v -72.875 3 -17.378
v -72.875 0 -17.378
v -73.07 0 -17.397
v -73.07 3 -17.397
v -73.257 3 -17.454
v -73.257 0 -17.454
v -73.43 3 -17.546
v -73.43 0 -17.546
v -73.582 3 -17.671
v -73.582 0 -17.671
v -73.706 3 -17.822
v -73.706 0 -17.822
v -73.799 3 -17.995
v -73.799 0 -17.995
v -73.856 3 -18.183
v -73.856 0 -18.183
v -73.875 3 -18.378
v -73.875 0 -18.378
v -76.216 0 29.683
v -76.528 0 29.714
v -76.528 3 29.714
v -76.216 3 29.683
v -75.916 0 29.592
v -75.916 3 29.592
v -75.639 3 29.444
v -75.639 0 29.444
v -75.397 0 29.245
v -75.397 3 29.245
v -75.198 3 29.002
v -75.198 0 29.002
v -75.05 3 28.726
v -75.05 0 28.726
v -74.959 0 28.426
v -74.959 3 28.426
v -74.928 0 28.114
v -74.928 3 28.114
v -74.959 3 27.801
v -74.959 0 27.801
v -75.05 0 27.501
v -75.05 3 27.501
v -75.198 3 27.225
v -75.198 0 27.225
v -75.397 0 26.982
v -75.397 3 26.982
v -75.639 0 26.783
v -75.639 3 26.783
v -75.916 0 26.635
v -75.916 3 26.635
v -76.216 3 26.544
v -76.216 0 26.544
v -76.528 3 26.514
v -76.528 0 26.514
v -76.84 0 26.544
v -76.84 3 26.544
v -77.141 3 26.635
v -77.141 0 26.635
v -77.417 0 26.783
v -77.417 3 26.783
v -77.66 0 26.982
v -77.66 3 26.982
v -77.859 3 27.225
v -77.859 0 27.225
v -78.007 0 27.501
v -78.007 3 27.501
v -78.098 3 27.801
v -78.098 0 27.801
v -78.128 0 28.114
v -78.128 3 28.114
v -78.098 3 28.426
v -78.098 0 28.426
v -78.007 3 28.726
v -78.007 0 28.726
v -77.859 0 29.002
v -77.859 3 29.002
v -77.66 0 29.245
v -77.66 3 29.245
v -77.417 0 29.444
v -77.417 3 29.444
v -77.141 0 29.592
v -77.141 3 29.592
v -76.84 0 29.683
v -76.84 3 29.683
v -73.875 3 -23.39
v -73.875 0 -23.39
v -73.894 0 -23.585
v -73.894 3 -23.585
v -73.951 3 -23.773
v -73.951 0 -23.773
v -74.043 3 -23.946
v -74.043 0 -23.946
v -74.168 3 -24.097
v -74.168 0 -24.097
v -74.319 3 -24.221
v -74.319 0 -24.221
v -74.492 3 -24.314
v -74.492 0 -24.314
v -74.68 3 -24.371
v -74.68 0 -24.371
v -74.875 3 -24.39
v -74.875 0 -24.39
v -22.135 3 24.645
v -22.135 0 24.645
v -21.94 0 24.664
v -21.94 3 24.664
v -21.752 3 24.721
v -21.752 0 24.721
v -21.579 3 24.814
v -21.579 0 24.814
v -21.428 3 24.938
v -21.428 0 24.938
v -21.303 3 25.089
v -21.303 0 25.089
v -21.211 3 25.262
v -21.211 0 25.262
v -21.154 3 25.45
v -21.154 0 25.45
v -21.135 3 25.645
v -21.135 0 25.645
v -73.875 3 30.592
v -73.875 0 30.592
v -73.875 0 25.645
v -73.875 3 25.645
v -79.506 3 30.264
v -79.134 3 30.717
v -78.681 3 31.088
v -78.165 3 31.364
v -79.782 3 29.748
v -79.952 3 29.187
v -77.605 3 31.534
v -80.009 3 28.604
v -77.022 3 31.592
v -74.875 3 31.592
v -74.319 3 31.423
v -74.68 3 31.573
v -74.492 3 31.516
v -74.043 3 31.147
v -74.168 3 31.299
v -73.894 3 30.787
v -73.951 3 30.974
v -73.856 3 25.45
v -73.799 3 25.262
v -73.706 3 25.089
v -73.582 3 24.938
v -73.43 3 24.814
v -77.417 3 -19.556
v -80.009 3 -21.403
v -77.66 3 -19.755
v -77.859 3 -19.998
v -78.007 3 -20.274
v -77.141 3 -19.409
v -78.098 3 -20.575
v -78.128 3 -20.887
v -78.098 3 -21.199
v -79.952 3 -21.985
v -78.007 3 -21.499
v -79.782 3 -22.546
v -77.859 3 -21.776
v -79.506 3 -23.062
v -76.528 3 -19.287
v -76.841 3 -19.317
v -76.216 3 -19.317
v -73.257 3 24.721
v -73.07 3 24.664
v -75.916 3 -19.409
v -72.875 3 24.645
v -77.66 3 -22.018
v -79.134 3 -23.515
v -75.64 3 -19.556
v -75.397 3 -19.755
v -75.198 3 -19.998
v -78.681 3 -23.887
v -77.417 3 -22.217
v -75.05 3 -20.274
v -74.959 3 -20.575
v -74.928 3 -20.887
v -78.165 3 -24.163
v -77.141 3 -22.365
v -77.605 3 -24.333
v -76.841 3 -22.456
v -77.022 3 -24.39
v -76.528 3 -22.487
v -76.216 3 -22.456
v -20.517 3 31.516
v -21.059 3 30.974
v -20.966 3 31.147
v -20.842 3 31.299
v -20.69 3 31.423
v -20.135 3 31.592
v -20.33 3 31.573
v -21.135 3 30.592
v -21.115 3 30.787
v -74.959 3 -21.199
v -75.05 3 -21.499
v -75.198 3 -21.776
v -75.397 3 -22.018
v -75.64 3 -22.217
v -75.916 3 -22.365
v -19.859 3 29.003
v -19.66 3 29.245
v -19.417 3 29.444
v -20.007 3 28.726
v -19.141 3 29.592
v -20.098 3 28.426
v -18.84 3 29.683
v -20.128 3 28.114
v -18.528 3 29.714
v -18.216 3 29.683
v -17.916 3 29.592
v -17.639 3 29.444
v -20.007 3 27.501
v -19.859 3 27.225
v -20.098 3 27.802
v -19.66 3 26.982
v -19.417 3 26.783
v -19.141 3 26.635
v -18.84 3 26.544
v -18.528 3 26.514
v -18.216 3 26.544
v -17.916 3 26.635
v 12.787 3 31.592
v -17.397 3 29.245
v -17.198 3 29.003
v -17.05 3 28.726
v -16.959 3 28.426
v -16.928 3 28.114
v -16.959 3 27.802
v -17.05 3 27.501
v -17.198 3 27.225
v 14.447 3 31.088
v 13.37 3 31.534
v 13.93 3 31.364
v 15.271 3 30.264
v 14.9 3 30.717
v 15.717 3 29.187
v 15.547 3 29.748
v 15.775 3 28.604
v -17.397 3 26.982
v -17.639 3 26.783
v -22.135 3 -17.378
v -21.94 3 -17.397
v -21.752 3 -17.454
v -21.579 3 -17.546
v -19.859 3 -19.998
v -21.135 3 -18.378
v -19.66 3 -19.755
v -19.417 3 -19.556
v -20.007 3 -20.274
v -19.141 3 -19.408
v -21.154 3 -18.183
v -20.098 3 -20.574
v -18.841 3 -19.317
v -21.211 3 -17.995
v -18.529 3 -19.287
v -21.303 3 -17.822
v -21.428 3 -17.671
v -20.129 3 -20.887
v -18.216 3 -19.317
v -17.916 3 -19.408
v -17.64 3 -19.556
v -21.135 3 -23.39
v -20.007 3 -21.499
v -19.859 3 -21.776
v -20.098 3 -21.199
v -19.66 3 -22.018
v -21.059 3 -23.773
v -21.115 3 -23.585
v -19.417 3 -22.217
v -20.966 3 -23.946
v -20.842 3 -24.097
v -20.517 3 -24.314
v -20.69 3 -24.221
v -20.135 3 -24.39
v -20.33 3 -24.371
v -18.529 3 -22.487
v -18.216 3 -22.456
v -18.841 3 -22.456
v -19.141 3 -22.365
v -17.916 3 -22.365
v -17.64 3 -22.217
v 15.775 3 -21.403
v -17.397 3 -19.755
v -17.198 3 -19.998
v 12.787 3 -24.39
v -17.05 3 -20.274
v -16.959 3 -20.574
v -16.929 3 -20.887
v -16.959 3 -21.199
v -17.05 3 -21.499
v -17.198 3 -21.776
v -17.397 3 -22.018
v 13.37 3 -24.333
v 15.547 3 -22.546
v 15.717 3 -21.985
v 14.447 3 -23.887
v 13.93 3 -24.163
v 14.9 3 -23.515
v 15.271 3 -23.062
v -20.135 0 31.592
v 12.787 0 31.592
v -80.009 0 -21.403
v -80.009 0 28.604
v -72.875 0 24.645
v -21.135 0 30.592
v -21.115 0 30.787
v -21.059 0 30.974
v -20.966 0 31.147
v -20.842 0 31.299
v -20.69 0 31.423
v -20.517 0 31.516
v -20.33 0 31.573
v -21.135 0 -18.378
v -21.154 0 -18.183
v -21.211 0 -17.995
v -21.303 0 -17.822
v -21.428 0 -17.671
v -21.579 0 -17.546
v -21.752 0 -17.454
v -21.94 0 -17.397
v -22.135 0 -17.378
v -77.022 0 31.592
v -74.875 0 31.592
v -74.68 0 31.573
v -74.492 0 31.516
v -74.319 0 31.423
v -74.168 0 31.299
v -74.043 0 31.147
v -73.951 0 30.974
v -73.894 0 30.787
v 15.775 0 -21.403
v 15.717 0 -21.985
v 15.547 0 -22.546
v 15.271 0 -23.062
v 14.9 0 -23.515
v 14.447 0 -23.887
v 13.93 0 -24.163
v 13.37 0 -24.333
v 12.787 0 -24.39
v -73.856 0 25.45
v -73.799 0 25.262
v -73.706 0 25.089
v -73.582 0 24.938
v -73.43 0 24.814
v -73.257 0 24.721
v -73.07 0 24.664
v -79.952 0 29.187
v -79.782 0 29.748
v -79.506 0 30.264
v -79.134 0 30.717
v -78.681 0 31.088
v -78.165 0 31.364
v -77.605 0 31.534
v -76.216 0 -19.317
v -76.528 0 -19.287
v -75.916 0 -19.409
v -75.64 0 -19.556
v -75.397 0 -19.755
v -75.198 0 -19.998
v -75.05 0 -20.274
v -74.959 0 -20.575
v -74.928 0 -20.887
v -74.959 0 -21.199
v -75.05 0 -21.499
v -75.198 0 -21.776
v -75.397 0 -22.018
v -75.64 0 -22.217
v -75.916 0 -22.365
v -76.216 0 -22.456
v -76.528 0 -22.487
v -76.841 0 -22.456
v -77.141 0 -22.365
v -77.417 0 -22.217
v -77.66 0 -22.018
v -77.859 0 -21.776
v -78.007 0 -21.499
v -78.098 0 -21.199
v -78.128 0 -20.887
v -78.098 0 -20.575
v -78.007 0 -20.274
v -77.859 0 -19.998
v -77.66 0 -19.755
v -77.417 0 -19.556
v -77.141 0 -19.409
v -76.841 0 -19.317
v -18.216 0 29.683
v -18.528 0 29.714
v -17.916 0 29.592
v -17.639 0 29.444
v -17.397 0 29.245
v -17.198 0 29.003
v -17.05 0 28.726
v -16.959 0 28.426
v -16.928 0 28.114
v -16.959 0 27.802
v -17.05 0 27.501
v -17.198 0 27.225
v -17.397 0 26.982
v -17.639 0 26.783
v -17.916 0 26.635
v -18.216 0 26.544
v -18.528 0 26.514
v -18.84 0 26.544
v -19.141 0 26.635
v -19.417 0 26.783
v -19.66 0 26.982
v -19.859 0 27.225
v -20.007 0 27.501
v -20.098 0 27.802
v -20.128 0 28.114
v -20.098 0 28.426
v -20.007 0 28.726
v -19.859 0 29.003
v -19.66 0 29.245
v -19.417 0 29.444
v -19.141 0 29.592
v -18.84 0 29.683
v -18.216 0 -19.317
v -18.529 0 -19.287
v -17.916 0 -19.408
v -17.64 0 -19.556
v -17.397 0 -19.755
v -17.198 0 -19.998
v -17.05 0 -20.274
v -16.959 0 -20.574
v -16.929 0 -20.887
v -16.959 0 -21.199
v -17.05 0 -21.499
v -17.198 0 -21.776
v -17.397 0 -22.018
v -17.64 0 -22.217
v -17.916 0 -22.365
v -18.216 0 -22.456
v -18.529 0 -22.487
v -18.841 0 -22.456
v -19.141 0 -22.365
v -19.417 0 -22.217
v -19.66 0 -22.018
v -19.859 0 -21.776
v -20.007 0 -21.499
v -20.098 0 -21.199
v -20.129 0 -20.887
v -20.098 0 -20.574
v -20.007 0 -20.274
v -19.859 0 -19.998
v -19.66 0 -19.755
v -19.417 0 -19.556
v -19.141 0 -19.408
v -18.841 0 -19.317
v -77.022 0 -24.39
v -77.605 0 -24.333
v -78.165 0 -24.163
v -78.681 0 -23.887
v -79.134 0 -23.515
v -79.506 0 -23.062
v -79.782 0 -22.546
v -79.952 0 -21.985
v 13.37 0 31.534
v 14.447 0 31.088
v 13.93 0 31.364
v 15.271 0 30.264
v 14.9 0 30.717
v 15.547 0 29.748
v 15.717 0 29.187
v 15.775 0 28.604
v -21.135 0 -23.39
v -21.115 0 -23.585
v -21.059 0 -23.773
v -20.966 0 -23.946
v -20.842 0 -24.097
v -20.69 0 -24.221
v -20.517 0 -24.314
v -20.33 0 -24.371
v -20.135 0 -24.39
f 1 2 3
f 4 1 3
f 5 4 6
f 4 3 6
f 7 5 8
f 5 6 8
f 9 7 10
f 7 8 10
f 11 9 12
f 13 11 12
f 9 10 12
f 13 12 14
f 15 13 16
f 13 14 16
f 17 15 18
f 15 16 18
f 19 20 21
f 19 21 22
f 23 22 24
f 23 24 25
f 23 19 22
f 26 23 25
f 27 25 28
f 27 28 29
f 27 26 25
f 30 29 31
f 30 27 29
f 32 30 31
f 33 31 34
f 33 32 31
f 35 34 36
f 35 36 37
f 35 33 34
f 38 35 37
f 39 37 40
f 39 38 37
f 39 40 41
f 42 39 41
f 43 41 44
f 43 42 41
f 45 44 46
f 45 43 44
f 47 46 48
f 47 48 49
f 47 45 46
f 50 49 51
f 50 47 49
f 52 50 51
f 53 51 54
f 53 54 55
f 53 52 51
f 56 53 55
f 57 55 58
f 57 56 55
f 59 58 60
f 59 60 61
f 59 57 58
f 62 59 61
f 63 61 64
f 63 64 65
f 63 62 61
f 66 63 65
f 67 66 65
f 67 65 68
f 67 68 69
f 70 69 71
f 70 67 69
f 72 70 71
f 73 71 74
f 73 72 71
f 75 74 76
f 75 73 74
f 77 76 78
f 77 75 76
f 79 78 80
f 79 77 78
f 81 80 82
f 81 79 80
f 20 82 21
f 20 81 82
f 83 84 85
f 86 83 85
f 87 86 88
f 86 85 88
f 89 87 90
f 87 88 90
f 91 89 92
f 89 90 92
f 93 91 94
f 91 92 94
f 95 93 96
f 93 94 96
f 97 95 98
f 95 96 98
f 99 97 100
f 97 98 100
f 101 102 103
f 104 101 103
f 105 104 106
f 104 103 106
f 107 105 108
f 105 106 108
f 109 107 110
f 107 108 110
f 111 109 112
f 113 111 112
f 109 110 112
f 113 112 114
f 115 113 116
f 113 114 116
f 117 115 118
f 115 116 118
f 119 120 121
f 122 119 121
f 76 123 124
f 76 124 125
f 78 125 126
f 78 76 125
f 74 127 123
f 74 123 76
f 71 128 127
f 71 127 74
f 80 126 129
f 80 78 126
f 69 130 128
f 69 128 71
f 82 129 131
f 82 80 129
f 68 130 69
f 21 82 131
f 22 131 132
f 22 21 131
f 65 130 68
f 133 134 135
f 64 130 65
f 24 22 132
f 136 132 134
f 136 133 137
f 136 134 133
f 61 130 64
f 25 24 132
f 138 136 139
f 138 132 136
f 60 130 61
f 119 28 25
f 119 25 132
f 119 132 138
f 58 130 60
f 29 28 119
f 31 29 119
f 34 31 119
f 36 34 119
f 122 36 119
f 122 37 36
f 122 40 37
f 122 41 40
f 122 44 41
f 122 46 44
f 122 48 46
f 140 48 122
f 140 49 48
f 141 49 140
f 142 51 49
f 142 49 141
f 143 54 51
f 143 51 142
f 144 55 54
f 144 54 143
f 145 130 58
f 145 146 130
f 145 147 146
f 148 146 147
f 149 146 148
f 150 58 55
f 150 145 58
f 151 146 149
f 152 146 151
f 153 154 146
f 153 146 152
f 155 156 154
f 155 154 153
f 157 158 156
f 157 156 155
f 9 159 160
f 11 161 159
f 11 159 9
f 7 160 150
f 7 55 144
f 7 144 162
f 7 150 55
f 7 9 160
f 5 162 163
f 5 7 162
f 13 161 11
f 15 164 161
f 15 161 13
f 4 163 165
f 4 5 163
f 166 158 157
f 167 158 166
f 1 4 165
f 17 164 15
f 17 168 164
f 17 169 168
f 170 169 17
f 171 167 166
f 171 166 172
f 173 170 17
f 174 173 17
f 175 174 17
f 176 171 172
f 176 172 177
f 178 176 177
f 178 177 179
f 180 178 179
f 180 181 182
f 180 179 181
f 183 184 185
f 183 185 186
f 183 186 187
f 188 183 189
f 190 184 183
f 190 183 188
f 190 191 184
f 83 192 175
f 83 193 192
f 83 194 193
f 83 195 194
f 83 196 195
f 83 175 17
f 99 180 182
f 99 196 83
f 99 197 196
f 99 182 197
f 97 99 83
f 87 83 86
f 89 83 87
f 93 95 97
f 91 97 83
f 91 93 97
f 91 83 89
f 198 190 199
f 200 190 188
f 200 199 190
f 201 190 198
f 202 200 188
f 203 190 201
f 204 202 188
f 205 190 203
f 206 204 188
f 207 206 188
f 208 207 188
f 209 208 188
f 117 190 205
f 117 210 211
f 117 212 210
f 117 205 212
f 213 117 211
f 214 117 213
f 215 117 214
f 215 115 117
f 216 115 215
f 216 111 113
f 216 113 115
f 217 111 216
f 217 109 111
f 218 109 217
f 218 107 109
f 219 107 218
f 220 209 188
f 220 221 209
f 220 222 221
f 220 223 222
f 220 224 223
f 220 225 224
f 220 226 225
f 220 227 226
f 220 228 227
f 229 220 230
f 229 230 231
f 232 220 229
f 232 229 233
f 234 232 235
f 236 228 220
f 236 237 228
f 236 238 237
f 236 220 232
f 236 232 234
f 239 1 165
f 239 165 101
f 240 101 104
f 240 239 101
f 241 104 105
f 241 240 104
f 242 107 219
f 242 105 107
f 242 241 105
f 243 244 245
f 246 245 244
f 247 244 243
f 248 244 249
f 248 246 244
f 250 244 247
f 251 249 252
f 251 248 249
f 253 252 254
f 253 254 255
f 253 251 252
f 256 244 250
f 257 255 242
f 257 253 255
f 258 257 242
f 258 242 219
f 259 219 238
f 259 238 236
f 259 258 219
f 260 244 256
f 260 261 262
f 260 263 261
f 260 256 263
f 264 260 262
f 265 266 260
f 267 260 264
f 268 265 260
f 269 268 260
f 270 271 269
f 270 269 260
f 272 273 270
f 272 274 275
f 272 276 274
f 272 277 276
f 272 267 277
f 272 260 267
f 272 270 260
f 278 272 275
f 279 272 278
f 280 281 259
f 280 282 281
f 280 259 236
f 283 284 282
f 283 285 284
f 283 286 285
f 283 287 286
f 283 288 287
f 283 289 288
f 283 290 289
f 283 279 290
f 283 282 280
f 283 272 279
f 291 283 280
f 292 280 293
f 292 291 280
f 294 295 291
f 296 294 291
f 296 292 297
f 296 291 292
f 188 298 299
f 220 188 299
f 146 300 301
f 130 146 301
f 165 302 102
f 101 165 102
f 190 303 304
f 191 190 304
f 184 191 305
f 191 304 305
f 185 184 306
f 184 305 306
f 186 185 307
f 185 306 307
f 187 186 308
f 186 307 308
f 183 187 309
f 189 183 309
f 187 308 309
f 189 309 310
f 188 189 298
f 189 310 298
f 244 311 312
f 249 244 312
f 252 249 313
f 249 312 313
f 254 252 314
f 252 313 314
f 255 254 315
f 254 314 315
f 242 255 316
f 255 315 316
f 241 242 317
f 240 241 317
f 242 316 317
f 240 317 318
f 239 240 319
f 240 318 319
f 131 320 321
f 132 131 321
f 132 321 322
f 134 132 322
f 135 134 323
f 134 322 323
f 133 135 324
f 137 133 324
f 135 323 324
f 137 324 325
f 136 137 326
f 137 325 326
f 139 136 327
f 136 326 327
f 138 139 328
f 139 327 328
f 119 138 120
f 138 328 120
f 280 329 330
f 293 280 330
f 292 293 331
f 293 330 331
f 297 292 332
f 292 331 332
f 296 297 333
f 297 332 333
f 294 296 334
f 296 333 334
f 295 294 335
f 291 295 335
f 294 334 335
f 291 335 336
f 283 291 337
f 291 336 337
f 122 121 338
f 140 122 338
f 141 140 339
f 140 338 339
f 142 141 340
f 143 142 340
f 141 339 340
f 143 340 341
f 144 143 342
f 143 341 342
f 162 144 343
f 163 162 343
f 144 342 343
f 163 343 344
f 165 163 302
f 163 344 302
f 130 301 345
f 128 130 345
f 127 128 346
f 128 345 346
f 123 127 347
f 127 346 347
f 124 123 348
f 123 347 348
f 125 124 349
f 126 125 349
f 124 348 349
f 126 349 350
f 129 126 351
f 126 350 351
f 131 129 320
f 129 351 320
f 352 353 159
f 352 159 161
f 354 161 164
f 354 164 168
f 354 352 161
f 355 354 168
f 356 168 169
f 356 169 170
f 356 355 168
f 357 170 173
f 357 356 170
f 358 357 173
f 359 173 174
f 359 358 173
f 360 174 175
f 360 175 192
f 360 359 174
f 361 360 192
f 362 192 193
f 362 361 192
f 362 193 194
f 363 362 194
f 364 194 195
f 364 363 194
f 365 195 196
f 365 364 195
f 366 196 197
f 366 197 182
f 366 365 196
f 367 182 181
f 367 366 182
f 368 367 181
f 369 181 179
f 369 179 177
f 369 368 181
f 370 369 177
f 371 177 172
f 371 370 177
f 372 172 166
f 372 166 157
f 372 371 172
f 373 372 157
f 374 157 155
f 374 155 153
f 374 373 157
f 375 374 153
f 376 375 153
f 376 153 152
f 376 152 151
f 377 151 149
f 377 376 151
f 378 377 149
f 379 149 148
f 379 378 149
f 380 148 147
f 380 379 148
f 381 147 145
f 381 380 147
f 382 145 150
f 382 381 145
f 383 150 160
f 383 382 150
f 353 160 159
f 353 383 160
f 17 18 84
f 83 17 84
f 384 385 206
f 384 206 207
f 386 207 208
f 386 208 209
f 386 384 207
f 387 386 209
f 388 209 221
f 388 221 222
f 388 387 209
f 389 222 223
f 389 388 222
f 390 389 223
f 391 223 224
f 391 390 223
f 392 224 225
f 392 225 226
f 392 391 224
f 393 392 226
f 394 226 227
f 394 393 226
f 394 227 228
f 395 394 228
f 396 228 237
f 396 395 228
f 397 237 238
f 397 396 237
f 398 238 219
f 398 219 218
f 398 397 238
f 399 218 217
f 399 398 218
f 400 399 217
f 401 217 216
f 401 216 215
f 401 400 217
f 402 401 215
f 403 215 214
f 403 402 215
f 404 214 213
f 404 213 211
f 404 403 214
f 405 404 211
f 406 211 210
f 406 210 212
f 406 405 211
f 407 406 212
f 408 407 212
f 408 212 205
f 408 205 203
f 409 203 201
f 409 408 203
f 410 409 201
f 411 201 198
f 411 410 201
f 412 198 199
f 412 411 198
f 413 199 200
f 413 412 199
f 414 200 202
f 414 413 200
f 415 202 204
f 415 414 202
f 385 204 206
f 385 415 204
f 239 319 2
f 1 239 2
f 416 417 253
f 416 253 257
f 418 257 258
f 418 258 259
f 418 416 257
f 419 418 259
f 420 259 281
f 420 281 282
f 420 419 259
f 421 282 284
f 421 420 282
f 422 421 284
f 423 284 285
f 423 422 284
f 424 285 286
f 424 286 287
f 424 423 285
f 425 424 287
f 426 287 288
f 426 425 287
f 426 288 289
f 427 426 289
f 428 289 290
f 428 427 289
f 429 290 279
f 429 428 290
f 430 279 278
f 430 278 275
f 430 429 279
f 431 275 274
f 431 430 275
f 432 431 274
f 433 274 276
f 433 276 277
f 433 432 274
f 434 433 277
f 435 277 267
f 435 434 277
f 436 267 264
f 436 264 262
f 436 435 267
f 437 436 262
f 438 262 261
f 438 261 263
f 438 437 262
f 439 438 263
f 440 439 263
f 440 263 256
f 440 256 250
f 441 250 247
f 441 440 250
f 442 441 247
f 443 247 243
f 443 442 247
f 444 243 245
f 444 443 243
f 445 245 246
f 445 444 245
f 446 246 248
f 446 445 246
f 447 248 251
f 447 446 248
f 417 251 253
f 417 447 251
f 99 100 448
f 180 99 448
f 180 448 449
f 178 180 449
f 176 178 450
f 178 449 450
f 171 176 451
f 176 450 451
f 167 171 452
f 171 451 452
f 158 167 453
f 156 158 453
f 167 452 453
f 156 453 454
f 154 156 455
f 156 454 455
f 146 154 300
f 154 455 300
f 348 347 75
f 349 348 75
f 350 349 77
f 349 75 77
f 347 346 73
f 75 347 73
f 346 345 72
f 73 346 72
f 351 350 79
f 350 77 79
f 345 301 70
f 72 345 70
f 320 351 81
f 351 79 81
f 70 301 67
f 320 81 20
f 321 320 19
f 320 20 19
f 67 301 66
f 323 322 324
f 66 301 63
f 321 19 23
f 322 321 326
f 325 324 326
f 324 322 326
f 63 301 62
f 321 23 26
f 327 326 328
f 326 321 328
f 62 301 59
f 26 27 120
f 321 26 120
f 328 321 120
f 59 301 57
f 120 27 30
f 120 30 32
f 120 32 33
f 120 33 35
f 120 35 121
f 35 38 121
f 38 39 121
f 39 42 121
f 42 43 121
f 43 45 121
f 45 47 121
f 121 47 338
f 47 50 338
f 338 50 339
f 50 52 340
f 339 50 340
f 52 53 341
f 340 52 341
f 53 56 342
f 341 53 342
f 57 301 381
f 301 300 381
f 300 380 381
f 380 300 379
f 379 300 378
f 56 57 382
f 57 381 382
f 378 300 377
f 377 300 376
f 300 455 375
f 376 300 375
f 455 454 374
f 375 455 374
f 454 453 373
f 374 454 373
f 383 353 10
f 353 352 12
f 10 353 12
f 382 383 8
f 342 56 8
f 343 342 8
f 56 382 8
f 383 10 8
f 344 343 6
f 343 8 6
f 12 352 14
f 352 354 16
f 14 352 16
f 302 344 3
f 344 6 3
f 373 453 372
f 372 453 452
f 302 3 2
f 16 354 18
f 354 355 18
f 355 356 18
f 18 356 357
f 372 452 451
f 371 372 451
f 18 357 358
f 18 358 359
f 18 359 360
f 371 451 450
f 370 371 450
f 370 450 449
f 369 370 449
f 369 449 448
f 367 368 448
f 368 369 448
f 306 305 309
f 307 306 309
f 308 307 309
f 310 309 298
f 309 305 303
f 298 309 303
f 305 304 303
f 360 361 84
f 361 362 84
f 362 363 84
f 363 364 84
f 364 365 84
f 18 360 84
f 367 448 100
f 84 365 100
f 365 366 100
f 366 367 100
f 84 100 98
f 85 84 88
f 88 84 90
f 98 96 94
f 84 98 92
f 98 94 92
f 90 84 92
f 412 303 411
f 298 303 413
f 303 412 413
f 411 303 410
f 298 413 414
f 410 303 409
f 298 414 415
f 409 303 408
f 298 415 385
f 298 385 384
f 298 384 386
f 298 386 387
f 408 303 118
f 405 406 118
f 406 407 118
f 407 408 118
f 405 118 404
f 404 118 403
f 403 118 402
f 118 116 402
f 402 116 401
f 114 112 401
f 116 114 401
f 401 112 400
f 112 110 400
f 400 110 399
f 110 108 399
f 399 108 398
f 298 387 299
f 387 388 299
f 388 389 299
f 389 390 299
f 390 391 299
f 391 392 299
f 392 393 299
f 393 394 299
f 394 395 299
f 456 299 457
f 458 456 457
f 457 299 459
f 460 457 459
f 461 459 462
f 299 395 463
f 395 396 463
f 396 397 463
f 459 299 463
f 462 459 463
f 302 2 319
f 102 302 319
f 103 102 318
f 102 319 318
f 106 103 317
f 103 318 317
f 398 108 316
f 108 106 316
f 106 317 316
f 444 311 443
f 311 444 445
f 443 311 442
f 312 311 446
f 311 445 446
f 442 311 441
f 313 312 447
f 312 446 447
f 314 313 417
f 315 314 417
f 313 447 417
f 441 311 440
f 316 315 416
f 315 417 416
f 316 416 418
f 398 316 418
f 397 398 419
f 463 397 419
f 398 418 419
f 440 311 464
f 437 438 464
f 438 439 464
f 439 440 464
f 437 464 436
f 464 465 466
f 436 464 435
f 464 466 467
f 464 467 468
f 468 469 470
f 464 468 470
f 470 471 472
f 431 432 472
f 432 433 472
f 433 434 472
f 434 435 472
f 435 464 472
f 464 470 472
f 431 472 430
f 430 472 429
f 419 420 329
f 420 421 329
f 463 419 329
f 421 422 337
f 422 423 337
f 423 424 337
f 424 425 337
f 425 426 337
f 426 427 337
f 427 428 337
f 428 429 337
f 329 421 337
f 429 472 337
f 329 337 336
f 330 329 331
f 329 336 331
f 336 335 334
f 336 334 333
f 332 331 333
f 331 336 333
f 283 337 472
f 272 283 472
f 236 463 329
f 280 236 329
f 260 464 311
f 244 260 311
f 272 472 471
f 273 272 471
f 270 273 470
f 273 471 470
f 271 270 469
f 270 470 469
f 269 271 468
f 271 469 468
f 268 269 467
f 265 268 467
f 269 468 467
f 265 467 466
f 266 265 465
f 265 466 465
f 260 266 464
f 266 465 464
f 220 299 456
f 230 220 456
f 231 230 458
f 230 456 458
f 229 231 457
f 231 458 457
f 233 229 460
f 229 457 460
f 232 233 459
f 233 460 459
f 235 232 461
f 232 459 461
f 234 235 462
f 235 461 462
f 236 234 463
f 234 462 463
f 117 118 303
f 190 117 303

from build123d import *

# Parameters (mm, degrees)
SKETCH_1_R      = 1.6
EXTRUDE_1_DEPTH = 3


with BuildPart() as part:
    # 草图1 → 凸台-拉伸1 (new body)
    with BuildSketch(Plane(origin=(0, 0, 0), x_dir=(1, 0, 0), z_dir=(0, 1, 0))):
        with BuildLine():
            Line((-21.134628196, 23.389975432), (-21.134628196, 18.377736005))
            ThreePointArc((-21.134628196, 18.377736005), (-21.427521415, 17.670629223), (-22.134628196, 17.377736005))
            Line((-22.134628196, 17.377736005), (-72.874730915, 17.377736005))
            ThreePointArc((-72.874730915, 17.377736005), (-73.581837696, 17.670629223), (-73.874730915, 18.377736005))
            Line((-73.874730915, 18.377736005), (-73.874730915, 23.389975432))
            ThreePointArc((-73.874730915, 23.389975432), (-74.167624134, 24.097082213), (-74.874730915, 24.389975432))
            Line((-74.874730915, 24.389975432), (-77.021723127, 24.389975432))
            ThreePointArc((-77.021723127, 24.389975432), (-79.134066788, 23.515014039), (-80.009028181, 21.402670377))
            Line((-80.009028181, 21.402670377), (-80.009028181, -28.604431477))
            ThreePointArc((-80.009028181, -28.604431477), (-79.134066788, -30.716775138), (-77.021723127, -31.591736531))
            Line((-77.021723127, -31.591736531), (-74.874730915, -31.591736531))
            ThreePointArc((-74.874730915, -31.591736531), (-74.167624134, -31.298843313), (-73.874730915, -30.591736531))
            Line((-73.874730915, -30.591736531), (-73.874730915, -25.64502865))
            ThreePointArc((-73.874730915, -25.64502865), (-73.581837696, -24.937921869), (-72.874730915, -24.64502865))
            Line((-72.874730915, -24.64502865), (-22.134628196, -24.64502865))
            ThreePointArc((-22.134628196, -24.64502865), (-21.427521415, -24.937921869), (-21.134628196, -25.64502865))
            Line((-21.134628196, -25.64502865), (-21.134628196, -30.591736531))
            ThreePointArc((-21.134628196, -30.591736531), (-20.841734977, -31.298843313), (-20.134628196, -31.591736531))
            Line((-20.134628196, -31.591736531), (12.787258331, -31.591736531))
            ThreePointArc((12.787258331, -31.591736531), (14.899601993, -30.716775138), (15.774563386, -28.604431477))
            Line((15.774563386, -28.604431477), (15.774563386, 21.402670377))
            ThreePointArc((15.774563386, 21.402670377), (14.899601993, 23.515014039), (12.787258331, 24.389975432))
            Line((12.787258331, 24.389975432), (-20.134628196, 24.389975432))
            ThreePointArc((-20.134628196, 24.389975432), (-20.841734977, 24.097082213), (-21.134628196, 23.389975432))
        make_face()
        with Locations(Location((-76.52848462, 20.886724226, 0), (0, 0, 270))):
            Circle(SKETCH_1_R, mode=Mode.SUBTRACT)
        with Locations(Location((-18.52858622, 20.886597225, 0), (0, 0, 270))):
            Circle(SKETCH_1_R, mode=Mode.SUBTRACT)
        with Locations(Location((-18.52833222, -28.113656775, 0), (0, 0, 270))):
            Circle(SKETCH_1_R, mode=Mode.SUBTRACT)
        with Locations(Location((-76.52833222, -28.113529775, 0), (0, 0, 270))):
            Circle(SKETCH_1_R, mode=Mode.SUBTRACT)
    extrude(amount=EXTRUDE_1_DEPTH)


solid = part.part
